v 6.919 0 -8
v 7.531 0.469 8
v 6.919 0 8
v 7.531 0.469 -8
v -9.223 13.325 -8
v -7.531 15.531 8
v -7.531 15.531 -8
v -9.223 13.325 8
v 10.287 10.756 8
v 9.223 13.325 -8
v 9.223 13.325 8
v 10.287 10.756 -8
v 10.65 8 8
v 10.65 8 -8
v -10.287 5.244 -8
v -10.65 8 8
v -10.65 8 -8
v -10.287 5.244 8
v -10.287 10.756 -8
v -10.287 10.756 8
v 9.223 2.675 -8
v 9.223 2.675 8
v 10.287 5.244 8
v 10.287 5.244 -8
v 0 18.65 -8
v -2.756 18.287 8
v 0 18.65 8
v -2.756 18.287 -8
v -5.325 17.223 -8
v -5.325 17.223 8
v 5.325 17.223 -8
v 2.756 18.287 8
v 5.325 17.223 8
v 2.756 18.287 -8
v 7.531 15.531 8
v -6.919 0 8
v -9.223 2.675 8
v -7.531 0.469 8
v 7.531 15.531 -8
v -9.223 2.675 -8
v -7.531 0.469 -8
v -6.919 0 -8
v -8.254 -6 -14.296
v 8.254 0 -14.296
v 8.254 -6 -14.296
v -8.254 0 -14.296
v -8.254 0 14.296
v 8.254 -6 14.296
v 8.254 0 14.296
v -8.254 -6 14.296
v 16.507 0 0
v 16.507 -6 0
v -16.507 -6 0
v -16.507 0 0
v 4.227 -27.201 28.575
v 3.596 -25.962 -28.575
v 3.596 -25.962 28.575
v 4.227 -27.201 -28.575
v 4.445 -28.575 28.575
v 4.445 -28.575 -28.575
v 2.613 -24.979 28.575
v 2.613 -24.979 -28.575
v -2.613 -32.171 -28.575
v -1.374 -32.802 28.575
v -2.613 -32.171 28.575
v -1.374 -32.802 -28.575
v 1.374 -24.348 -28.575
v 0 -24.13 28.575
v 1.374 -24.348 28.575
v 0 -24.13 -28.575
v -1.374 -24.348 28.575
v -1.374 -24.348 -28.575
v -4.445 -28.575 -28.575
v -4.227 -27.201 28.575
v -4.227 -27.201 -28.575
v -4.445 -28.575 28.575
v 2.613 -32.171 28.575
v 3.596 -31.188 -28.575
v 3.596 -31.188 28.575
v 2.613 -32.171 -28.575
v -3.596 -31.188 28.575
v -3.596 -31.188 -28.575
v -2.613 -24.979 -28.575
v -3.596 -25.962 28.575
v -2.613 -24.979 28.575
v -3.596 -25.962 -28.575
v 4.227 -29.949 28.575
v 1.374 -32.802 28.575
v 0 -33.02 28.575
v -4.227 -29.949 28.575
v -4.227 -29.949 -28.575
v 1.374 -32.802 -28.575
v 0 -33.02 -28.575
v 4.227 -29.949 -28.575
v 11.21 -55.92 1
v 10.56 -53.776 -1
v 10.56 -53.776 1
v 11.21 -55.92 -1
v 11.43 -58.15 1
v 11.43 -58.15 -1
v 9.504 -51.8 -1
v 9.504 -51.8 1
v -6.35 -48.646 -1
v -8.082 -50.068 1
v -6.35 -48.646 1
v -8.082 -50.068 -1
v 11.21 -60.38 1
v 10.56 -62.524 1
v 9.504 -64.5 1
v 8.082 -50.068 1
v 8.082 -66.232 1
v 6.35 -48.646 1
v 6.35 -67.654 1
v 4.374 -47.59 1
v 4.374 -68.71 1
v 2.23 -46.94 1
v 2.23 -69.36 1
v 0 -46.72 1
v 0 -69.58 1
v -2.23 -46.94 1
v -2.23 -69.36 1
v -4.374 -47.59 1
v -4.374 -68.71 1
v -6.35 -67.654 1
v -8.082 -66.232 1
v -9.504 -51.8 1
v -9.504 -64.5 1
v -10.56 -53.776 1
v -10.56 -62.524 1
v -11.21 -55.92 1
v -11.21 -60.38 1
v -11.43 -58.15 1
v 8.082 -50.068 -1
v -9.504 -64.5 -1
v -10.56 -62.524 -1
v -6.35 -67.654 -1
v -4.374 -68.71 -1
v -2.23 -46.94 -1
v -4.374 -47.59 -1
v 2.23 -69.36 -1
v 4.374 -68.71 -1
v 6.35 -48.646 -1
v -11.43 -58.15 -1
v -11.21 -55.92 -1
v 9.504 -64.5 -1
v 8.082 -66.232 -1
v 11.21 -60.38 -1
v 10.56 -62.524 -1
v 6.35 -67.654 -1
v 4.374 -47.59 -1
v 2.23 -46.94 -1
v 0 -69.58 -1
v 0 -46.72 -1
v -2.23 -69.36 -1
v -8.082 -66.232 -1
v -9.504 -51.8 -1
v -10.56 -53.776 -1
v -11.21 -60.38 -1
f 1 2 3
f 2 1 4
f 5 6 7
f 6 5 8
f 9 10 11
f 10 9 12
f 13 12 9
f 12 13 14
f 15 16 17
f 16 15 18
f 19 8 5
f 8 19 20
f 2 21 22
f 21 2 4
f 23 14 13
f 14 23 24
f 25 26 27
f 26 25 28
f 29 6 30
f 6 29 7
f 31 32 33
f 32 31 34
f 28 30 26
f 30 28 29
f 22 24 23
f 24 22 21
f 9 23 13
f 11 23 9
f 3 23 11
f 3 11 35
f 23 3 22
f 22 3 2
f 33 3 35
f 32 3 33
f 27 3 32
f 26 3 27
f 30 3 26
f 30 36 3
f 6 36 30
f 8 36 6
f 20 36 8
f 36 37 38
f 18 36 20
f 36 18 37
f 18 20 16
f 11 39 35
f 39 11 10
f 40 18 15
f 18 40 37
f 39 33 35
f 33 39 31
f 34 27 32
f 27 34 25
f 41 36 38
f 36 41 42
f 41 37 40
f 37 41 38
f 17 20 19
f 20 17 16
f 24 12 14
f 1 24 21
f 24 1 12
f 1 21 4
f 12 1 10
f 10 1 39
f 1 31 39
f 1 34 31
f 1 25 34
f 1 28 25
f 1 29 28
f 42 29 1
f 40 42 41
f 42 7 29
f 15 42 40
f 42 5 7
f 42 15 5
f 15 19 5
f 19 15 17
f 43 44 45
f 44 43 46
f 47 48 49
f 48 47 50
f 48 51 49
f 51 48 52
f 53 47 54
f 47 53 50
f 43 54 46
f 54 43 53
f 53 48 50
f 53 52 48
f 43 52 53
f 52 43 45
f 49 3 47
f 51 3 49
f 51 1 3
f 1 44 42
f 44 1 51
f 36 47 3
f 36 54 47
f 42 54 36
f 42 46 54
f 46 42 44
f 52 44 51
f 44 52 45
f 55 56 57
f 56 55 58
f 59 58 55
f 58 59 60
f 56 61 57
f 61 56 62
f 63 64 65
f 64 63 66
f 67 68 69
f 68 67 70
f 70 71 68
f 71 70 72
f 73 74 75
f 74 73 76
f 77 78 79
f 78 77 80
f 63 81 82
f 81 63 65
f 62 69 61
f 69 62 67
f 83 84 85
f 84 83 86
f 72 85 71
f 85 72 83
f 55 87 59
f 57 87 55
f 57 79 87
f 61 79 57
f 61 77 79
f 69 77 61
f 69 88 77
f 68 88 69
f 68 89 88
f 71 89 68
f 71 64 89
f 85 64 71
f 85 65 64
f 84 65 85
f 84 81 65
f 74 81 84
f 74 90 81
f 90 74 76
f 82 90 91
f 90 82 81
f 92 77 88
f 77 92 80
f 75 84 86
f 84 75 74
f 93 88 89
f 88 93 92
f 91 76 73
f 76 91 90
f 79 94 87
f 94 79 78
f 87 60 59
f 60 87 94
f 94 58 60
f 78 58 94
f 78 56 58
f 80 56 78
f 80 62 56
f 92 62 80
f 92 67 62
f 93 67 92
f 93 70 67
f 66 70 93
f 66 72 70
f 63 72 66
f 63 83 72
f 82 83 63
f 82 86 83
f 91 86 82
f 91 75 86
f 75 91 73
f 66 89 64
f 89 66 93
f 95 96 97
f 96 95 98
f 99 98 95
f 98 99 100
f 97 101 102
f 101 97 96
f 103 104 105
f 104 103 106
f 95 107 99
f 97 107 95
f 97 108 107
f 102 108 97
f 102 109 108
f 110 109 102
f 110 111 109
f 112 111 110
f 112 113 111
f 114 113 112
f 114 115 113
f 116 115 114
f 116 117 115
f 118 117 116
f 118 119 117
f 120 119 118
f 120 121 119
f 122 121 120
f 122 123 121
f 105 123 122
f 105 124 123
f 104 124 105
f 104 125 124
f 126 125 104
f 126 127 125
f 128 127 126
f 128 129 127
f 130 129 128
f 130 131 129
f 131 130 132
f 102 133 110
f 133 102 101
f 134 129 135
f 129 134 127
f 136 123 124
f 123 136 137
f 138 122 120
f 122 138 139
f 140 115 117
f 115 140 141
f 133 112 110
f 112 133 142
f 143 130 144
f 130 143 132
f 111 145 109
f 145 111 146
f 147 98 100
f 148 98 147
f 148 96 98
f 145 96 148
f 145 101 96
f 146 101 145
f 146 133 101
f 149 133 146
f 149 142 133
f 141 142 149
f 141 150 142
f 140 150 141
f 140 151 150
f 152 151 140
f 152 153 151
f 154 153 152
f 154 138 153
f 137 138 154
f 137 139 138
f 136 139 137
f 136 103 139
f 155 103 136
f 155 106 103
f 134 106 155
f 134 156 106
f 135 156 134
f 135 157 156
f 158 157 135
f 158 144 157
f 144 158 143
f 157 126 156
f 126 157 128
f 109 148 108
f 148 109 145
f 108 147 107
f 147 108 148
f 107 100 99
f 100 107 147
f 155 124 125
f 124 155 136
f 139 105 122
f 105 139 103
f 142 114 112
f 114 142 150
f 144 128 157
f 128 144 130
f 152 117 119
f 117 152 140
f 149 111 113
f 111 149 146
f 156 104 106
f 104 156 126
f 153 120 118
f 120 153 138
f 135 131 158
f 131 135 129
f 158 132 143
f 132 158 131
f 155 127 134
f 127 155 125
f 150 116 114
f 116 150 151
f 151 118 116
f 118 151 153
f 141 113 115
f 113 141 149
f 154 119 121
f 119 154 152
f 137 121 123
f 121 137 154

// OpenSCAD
// Auto-generated by scripts/author_from_manifest.py (Phase D.3).
// Source: data/phase_d_manifest.json (sku_intent='senju-znqr-pendent-200f').
// Do not hand-edit — regenerate from the manifest.
//
// @part senju_znqr_pendent_200f
// @kind sprinkler_head
// @category head.pendant.k56
// @display-name "Senju ZN-QR Quick Response Pendent K5.6 200°F"
// @mfg senju_sprinkler
// @mfg-pn ZN-QR
// @listing UL FM
// @hazard-classes LH OH1
// @price-usd 13.40
// @install-minutes 8
// @crew journeyman
// @k-factor 5.6
// @orientation pendant
// @response quick
// @temperature 200F
// @param size_in number default=0.5 label="Size" unit="in"
// @port inlet position=[0,0.014,0] direction=[0,1,0] style=NPT_threaded size_in=0.5 role=drop

size_in = 0.5;
k_factor = 5.6;

length_mm   = 57.15;
body_dia_mm = 25.40;
thread_od   = 21.3;
thread_len  = 16;
deflector_d = body_dia_mm * 0.9;

 union() {
    translate([0, thread_len/2, 0])
        cylinder(h = thread_len, d = thread_od, center = true, $fn = 24);
    translate([0, -3, 0])
        rotate([90, 0, 0])
        cylinder(h = 6, d = thread_od * 1.55, $fn = 6, center = true);
    translate([0, -length_mm/2, 0])
        cylinder(h = length_mm, d = body_dia_mm * 0.35, center = true, $fn = 20);
    translate([0, -length_mm - 1, 0])
        cylinder(h = 2, d = deflector_d, center = true, $fn = 32);
}
